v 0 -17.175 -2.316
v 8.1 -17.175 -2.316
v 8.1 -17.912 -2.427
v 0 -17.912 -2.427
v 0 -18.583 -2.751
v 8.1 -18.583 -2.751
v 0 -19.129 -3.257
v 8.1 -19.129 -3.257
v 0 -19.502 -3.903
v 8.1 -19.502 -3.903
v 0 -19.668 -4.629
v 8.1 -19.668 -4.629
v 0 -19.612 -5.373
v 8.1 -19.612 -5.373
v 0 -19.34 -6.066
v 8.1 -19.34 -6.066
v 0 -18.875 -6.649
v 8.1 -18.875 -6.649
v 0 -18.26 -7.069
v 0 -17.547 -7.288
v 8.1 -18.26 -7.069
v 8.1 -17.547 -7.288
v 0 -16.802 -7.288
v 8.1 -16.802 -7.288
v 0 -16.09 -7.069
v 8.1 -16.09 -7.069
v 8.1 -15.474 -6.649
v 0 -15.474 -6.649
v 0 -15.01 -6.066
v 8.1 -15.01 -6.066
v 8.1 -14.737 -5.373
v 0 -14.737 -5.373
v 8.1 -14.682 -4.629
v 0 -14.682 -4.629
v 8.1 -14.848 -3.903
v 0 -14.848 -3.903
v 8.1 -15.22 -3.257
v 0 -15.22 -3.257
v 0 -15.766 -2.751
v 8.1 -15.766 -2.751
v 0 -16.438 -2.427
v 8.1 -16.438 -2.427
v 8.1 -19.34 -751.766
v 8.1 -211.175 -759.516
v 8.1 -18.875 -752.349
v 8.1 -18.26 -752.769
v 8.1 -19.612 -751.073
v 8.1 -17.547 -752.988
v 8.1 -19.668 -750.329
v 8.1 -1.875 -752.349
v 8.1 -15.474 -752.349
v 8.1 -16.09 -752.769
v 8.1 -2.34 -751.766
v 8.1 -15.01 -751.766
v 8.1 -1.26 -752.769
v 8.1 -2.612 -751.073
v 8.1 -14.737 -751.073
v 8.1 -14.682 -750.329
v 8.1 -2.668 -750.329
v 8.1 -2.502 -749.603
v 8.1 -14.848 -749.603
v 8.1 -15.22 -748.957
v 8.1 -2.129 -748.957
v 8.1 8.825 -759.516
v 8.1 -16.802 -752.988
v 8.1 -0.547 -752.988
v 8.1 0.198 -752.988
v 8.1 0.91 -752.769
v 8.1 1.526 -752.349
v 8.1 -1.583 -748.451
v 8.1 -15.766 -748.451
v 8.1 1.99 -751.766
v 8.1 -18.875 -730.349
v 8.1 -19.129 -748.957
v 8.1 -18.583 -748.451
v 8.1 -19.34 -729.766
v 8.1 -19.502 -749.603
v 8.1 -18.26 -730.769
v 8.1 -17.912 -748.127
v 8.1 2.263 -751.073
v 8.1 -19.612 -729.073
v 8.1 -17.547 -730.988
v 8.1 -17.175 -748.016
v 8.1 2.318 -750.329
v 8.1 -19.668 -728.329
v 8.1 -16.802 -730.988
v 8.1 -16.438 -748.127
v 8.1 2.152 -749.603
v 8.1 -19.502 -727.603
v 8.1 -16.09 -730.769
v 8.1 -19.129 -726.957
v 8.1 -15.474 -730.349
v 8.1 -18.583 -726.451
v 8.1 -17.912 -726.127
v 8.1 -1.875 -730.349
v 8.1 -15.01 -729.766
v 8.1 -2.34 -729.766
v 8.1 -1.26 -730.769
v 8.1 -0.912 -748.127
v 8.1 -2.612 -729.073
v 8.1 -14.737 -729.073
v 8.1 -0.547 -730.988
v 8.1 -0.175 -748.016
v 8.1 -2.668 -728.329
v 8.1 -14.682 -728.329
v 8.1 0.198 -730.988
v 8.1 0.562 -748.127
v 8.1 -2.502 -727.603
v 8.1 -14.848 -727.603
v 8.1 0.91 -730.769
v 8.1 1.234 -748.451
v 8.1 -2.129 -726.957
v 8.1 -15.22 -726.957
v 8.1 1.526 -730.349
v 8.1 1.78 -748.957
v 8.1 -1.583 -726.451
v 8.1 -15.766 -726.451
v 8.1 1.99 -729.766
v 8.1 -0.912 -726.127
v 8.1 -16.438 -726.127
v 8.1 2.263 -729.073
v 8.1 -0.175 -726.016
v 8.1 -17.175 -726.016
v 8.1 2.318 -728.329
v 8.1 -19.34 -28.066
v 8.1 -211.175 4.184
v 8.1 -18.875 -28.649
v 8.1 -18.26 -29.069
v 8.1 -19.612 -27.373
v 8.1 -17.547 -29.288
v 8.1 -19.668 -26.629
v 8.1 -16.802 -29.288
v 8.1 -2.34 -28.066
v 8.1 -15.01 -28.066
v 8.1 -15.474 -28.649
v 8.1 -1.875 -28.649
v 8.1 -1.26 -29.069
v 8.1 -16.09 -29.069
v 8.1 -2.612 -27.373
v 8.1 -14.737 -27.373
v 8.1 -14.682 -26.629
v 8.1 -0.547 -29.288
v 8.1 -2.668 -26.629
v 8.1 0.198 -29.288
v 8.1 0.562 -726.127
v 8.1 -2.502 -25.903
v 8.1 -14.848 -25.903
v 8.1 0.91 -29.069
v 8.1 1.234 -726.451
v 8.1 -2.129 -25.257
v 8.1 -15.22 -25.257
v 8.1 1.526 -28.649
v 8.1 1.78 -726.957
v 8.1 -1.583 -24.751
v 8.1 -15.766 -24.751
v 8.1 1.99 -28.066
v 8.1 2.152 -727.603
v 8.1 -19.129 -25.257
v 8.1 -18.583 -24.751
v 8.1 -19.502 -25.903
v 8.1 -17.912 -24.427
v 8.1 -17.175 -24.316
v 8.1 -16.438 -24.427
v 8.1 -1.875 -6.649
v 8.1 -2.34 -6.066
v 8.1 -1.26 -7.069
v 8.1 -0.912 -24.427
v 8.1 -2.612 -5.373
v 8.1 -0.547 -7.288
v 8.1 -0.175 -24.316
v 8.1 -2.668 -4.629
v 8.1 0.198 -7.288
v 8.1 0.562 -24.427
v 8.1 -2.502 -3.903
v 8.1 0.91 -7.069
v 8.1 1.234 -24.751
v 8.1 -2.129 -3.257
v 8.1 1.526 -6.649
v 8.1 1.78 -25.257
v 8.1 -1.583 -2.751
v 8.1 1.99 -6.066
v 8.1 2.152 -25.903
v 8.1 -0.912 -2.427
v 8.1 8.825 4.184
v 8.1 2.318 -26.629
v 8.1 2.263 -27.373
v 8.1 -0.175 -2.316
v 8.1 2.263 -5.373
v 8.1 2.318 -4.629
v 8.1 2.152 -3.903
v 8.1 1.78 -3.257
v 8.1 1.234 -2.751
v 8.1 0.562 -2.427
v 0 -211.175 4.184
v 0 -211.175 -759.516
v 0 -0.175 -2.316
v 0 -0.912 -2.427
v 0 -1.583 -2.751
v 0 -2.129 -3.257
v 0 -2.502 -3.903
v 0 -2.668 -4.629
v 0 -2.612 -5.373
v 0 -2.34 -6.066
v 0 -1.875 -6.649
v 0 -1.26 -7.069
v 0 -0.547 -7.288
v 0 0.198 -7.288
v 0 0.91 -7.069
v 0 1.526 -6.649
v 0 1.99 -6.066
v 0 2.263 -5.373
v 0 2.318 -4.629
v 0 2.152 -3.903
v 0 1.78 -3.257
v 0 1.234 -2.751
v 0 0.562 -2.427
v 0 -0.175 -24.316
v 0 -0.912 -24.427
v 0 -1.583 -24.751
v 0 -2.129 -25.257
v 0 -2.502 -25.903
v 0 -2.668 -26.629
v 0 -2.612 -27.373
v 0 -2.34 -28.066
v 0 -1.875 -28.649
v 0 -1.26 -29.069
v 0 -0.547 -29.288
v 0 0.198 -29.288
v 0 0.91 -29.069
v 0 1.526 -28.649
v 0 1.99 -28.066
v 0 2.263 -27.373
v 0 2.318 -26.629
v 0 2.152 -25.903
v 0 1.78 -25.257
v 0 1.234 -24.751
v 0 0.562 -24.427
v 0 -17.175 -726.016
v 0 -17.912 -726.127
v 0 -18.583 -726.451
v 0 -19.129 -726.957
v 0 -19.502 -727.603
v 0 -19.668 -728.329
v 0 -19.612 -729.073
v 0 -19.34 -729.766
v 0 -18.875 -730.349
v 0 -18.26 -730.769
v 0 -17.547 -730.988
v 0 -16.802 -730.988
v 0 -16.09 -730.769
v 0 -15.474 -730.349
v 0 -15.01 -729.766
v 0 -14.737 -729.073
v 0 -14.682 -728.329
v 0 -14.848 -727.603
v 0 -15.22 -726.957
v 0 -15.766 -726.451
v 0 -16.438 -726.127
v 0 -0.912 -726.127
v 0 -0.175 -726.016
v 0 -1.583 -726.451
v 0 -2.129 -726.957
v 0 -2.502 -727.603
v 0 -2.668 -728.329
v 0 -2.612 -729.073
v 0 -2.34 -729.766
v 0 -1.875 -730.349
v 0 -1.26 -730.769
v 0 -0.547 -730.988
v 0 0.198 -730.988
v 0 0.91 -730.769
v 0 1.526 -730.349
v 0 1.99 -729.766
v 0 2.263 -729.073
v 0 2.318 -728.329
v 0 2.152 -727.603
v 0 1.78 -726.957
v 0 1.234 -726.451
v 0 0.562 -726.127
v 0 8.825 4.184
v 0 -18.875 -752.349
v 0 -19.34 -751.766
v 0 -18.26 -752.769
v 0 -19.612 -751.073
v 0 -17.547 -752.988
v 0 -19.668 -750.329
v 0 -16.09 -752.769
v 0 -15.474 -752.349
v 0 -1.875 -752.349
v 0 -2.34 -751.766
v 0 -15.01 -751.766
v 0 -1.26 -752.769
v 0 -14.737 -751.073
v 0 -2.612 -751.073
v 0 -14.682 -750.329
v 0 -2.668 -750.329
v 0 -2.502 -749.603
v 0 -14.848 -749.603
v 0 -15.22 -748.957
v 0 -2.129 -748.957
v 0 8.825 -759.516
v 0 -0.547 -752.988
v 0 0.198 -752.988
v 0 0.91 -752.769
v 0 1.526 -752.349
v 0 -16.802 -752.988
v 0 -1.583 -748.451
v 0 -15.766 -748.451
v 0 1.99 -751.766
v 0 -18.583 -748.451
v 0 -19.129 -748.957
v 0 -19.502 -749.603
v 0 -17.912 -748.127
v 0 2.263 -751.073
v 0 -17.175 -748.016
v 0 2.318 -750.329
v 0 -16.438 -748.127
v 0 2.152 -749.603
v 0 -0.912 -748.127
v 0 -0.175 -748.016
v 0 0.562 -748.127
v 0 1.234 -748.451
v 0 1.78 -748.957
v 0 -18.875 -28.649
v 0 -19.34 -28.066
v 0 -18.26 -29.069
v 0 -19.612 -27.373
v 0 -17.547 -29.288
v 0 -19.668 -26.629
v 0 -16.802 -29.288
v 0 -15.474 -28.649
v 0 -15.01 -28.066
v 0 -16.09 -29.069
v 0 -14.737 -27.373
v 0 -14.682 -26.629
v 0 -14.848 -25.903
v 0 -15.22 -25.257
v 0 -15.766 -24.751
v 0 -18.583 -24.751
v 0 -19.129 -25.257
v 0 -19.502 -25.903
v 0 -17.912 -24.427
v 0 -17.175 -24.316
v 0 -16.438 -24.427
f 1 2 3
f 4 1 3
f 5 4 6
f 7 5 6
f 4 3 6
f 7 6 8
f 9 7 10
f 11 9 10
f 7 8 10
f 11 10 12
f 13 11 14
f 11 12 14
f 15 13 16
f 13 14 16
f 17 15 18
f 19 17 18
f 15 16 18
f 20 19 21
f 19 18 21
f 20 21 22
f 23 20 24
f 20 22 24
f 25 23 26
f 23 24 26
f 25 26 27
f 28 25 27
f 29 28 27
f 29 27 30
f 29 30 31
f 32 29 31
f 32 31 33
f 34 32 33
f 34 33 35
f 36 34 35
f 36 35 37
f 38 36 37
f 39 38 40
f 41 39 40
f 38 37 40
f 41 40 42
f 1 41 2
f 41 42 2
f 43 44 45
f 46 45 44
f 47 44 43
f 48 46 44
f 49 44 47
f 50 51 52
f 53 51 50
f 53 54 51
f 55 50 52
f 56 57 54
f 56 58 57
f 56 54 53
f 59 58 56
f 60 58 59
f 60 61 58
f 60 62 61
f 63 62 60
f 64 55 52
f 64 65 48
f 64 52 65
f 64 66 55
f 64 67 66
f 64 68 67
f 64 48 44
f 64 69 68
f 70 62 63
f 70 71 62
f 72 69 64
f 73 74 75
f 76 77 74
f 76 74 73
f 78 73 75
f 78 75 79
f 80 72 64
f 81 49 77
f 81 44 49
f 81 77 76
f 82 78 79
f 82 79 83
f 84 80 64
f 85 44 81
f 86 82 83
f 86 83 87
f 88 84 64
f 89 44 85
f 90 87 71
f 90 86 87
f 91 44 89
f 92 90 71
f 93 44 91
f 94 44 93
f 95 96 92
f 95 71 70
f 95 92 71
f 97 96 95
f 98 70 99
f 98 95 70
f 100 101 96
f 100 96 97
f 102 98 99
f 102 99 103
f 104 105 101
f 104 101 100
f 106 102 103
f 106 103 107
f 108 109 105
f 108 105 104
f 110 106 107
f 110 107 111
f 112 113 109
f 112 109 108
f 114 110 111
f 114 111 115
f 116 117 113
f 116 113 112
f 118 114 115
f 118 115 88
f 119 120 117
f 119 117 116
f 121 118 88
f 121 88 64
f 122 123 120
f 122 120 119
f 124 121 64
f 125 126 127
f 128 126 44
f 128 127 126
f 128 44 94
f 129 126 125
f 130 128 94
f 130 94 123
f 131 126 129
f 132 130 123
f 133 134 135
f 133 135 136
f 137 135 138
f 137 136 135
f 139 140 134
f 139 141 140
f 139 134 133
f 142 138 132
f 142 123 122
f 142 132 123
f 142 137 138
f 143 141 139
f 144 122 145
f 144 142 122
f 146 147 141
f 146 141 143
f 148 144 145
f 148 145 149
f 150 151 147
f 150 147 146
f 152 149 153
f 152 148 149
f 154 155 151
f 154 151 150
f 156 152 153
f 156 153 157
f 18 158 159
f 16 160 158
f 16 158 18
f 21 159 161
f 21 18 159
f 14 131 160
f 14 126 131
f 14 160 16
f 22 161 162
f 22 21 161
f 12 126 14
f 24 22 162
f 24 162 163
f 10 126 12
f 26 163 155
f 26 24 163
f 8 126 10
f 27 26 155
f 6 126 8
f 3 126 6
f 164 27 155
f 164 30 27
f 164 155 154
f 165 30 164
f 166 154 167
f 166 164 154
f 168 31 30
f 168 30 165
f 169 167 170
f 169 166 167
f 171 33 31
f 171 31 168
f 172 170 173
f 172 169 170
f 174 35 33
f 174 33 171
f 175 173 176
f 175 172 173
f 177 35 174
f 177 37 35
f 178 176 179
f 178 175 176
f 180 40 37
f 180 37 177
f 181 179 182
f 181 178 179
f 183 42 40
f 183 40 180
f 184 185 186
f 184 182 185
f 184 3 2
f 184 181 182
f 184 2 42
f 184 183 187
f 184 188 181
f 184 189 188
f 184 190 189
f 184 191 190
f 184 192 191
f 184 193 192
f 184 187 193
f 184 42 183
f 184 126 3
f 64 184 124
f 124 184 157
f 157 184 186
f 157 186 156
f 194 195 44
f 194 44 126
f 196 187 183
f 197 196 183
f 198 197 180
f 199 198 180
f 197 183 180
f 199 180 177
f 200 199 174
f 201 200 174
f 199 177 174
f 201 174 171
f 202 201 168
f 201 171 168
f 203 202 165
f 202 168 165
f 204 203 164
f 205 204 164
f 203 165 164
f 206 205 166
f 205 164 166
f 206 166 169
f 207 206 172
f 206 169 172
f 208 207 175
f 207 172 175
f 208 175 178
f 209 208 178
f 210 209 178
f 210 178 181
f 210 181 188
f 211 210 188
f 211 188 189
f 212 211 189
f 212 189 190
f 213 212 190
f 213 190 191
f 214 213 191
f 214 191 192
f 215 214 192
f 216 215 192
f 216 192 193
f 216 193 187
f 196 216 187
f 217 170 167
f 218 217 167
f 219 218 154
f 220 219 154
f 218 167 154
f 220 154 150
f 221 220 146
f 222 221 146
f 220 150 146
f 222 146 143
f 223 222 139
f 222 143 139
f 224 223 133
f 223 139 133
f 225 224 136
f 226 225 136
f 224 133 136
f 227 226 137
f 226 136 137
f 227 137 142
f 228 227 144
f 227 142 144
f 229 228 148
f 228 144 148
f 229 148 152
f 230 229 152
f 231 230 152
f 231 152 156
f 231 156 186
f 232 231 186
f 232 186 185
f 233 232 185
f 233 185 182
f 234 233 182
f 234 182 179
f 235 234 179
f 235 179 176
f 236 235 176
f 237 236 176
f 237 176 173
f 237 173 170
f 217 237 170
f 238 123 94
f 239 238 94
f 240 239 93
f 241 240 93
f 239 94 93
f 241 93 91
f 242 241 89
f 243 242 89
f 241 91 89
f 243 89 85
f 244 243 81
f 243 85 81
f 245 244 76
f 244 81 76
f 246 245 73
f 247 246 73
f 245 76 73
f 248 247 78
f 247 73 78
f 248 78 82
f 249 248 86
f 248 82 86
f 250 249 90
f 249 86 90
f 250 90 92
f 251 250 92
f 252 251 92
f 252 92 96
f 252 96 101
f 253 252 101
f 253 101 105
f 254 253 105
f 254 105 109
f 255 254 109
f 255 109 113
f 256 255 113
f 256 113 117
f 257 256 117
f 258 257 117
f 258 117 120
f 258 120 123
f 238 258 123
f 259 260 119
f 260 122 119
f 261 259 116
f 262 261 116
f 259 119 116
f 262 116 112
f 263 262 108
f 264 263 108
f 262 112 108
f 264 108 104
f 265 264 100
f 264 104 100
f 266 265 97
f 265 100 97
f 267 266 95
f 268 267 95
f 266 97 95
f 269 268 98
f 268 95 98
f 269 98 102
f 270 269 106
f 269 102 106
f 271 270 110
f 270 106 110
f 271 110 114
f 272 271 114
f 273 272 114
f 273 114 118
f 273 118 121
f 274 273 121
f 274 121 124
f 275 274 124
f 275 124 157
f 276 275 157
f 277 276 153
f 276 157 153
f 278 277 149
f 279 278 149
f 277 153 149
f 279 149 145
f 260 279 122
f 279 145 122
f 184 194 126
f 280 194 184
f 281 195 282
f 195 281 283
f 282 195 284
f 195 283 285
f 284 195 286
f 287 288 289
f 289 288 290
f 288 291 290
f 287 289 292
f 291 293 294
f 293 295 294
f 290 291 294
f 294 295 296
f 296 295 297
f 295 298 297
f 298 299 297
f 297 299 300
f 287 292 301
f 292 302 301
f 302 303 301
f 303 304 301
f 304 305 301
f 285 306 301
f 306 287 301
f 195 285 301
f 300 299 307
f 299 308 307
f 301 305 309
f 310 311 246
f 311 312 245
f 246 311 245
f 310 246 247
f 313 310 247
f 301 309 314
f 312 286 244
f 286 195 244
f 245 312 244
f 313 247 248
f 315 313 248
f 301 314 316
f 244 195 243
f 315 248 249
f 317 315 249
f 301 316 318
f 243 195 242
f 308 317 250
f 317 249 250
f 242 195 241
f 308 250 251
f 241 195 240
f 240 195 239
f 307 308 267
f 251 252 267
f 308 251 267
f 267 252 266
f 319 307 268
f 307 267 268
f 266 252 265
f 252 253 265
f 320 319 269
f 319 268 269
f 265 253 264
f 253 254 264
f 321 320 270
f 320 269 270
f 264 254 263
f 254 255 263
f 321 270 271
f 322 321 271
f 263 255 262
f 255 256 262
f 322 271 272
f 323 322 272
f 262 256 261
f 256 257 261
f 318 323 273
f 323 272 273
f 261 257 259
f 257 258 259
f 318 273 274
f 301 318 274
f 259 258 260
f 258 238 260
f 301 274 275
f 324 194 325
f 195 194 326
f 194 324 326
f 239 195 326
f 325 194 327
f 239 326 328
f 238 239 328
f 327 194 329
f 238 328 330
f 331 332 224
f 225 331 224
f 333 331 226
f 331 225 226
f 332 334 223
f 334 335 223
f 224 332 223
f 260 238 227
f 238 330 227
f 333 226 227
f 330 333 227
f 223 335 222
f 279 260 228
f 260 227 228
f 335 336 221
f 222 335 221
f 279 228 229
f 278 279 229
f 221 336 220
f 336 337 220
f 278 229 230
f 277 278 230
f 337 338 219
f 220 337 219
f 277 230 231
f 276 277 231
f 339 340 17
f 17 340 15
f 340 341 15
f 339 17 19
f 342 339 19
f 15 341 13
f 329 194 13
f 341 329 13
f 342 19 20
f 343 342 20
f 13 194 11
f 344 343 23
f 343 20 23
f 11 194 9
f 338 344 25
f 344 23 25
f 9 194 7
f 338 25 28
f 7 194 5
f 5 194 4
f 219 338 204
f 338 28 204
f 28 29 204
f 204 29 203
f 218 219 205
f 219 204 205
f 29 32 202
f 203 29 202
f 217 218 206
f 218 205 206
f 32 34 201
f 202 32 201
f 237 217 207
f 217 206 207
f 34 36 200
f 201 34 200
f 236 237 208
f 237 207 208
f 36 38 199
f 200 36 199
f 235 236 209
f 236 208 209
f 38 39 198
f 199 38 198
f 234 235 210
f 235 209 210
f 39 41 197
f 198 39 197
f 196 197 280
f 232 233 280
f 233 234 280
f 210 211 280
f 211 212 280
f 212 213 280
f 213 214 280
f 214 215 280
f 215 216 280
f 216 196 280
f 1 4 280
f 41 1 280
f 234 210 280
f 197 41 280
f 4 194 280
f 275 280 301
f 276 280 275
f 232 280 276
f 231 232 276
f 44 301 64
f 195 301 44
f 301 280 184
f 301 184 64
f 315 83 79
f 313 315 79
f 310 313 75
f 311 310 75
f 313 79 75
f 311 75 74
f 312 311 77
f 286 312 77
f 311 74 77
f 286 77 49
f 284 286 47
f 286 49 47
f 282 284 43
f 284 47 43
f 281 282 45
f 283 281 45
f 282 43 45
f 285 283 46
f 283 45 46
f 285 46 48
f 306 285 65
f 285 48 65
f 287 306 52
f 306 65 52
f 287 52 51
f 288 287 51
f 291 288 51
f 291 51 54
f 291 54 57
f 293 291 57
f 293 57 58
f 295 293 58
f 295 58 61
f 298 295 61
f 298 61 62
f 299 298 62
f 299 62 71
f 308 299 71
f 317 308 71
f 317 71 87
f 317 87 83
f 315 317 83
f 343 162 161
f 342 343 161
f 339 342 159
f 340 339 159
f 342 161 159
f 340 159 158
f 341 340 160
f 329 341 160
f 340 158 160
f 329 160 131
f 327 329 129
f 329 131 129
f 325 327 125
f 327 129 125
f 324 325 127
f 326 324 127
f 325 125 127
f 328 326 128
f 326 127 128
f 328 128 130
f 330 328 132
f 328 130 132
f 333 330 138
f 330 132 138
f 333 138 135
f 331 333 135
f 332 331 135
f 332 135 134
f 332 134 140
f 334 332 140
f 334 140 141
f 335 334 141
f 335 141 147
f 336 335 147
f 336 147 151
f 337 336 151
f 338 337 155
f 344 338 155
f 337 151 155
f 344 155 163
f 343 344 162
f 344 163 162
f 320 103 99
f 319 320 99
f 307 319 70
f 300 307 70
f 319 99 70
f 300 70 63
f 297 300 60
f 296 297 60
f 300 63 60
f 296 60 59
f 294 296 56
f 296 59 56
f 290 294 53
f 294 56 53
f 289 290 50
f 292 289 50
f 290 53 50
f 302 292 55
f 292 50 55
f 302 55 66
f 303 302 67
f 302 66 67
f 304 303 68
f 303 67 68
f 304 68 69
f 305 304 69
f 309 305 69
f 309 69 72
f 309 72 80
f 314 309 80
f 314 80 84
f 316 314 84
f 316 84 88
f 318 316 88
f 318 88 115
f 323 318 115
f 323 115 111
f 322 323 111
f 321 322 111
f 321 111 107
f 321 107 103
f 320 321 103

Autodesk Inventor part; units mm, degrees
ref_plane "YZ Plane" through (0, 0, 0) normal (1, 0, 0) x (0, 1, 0)
ref_plane "XZ Plane" through (0, 0, 0) normal (0, 1, 0) x (-1, 0, 0)
ref_plane "XY Plane" through (0, 0, 0) normal (0, 0, 1) x (1, 0, 0)
sketch "Skizze1" plane through (0, 0, 0) normal (1, 0, 0) x (0, 1, 0)
  line L0 (-211.1748, 4.1838) -> (8.8252, 4.1838)
  line L1 (8.8252, 4.1838) -> (8.8252, -759.5162)
  line L2 (8.8252, -759.5162) -> (-211.1748, -759.5162)
  line L3 (-211.1748, -759.5162) -> (-211.1748, 4.1838)
  point P0 (0, 0)
  dimension "d0" = 763.7
  dimension "d1" = 220
extrude "Extrusion1" add sketch "Skizze1" along normal blind 8.1
sketch "Skizze2" plane through (0, 0, 0) normal (-1, 0, 0) x (0, 0, 1)
  circle A0 centre (-4.8162, -0.1748) radius 2.5
  line L0 (4.1838, 8.8252) -> (4.1838, -211.1748) projected
  line L1 (-759.5162, 8.8252) -> (4.1838, 8.8252) projected
  circle A1 centre (-4.8162, -17.1748) radius 2.5
  circle A2 centre (-26.8162, -17.1748) radius 2.5
  circle A3 centre (-26.8162, -0.1748) radius 2.5
  line L2 (-377.6662, 9.6508) -> (-377.6662, -210.3492) construction
  line L3 (4.1838, -211.1748) -> (-759.5162, -211.1748) projected
  line L4 (-377.6662, 8.8252) -> (-157.6662, 8.8252) construction
  circle A4 centre (-750.5162, -0.1748) radius 2.5
  circle A5 centre (-750.5162, -17.1748) radius 2.5
  circle A6 centre (-728.5162, -17.1748) radius 2.5
  circle A7 centre (-728.5162, -0.1748) radius 2.5
  point P0 (0, 0)
  point P1 (-755.3323, 0)
  dimension "d4" = 5
  dimension "d5" = 9
  dimension "d6" = 9
  dimension "d7" = 5
  dimension "d8" = 5
  dimension "d9" = 5
  dimension "d10" = 17
  dimension "d11" = 9
  dimension "d12" = 22
  dimension "d13" = 17
  dimension "d14" = 17
  dimension "d15" = 22
  dimension "d17" = 381.85
hole "Bohrung1" at (0, -0.1748, -4.8162) direction (1, 0, 0) diameter 5 end through all
hole "Bohrung2" at (0, -17.1748, -4.8162) direction (1, 0, 0) diameter 5 end through all
hole "Bohrung3" at (0, -17.1748, -26.8162) direction (1, 0, 0) diameter 5 end through all
hole "Bohrung4" at (0, -0.1748, -26.8162) at (0, -17.1748, -750.5162) direction (1, 0, 0) diameter 5 end through all
hole "Bohrung5" at (0, -0.1748, -750.5162) direction (1, 0, 0) diameter 5 end through all
hole "Bohrung6" at (0, -0.1748, -728.5162) direction (1, 0, 0) diameter 5 end through all
hole "Bohrung7" at (0, -17.1748, -728.5162) direction (1, 0, 0) diameter 5 end through all
properties part number "FahneHolz"
